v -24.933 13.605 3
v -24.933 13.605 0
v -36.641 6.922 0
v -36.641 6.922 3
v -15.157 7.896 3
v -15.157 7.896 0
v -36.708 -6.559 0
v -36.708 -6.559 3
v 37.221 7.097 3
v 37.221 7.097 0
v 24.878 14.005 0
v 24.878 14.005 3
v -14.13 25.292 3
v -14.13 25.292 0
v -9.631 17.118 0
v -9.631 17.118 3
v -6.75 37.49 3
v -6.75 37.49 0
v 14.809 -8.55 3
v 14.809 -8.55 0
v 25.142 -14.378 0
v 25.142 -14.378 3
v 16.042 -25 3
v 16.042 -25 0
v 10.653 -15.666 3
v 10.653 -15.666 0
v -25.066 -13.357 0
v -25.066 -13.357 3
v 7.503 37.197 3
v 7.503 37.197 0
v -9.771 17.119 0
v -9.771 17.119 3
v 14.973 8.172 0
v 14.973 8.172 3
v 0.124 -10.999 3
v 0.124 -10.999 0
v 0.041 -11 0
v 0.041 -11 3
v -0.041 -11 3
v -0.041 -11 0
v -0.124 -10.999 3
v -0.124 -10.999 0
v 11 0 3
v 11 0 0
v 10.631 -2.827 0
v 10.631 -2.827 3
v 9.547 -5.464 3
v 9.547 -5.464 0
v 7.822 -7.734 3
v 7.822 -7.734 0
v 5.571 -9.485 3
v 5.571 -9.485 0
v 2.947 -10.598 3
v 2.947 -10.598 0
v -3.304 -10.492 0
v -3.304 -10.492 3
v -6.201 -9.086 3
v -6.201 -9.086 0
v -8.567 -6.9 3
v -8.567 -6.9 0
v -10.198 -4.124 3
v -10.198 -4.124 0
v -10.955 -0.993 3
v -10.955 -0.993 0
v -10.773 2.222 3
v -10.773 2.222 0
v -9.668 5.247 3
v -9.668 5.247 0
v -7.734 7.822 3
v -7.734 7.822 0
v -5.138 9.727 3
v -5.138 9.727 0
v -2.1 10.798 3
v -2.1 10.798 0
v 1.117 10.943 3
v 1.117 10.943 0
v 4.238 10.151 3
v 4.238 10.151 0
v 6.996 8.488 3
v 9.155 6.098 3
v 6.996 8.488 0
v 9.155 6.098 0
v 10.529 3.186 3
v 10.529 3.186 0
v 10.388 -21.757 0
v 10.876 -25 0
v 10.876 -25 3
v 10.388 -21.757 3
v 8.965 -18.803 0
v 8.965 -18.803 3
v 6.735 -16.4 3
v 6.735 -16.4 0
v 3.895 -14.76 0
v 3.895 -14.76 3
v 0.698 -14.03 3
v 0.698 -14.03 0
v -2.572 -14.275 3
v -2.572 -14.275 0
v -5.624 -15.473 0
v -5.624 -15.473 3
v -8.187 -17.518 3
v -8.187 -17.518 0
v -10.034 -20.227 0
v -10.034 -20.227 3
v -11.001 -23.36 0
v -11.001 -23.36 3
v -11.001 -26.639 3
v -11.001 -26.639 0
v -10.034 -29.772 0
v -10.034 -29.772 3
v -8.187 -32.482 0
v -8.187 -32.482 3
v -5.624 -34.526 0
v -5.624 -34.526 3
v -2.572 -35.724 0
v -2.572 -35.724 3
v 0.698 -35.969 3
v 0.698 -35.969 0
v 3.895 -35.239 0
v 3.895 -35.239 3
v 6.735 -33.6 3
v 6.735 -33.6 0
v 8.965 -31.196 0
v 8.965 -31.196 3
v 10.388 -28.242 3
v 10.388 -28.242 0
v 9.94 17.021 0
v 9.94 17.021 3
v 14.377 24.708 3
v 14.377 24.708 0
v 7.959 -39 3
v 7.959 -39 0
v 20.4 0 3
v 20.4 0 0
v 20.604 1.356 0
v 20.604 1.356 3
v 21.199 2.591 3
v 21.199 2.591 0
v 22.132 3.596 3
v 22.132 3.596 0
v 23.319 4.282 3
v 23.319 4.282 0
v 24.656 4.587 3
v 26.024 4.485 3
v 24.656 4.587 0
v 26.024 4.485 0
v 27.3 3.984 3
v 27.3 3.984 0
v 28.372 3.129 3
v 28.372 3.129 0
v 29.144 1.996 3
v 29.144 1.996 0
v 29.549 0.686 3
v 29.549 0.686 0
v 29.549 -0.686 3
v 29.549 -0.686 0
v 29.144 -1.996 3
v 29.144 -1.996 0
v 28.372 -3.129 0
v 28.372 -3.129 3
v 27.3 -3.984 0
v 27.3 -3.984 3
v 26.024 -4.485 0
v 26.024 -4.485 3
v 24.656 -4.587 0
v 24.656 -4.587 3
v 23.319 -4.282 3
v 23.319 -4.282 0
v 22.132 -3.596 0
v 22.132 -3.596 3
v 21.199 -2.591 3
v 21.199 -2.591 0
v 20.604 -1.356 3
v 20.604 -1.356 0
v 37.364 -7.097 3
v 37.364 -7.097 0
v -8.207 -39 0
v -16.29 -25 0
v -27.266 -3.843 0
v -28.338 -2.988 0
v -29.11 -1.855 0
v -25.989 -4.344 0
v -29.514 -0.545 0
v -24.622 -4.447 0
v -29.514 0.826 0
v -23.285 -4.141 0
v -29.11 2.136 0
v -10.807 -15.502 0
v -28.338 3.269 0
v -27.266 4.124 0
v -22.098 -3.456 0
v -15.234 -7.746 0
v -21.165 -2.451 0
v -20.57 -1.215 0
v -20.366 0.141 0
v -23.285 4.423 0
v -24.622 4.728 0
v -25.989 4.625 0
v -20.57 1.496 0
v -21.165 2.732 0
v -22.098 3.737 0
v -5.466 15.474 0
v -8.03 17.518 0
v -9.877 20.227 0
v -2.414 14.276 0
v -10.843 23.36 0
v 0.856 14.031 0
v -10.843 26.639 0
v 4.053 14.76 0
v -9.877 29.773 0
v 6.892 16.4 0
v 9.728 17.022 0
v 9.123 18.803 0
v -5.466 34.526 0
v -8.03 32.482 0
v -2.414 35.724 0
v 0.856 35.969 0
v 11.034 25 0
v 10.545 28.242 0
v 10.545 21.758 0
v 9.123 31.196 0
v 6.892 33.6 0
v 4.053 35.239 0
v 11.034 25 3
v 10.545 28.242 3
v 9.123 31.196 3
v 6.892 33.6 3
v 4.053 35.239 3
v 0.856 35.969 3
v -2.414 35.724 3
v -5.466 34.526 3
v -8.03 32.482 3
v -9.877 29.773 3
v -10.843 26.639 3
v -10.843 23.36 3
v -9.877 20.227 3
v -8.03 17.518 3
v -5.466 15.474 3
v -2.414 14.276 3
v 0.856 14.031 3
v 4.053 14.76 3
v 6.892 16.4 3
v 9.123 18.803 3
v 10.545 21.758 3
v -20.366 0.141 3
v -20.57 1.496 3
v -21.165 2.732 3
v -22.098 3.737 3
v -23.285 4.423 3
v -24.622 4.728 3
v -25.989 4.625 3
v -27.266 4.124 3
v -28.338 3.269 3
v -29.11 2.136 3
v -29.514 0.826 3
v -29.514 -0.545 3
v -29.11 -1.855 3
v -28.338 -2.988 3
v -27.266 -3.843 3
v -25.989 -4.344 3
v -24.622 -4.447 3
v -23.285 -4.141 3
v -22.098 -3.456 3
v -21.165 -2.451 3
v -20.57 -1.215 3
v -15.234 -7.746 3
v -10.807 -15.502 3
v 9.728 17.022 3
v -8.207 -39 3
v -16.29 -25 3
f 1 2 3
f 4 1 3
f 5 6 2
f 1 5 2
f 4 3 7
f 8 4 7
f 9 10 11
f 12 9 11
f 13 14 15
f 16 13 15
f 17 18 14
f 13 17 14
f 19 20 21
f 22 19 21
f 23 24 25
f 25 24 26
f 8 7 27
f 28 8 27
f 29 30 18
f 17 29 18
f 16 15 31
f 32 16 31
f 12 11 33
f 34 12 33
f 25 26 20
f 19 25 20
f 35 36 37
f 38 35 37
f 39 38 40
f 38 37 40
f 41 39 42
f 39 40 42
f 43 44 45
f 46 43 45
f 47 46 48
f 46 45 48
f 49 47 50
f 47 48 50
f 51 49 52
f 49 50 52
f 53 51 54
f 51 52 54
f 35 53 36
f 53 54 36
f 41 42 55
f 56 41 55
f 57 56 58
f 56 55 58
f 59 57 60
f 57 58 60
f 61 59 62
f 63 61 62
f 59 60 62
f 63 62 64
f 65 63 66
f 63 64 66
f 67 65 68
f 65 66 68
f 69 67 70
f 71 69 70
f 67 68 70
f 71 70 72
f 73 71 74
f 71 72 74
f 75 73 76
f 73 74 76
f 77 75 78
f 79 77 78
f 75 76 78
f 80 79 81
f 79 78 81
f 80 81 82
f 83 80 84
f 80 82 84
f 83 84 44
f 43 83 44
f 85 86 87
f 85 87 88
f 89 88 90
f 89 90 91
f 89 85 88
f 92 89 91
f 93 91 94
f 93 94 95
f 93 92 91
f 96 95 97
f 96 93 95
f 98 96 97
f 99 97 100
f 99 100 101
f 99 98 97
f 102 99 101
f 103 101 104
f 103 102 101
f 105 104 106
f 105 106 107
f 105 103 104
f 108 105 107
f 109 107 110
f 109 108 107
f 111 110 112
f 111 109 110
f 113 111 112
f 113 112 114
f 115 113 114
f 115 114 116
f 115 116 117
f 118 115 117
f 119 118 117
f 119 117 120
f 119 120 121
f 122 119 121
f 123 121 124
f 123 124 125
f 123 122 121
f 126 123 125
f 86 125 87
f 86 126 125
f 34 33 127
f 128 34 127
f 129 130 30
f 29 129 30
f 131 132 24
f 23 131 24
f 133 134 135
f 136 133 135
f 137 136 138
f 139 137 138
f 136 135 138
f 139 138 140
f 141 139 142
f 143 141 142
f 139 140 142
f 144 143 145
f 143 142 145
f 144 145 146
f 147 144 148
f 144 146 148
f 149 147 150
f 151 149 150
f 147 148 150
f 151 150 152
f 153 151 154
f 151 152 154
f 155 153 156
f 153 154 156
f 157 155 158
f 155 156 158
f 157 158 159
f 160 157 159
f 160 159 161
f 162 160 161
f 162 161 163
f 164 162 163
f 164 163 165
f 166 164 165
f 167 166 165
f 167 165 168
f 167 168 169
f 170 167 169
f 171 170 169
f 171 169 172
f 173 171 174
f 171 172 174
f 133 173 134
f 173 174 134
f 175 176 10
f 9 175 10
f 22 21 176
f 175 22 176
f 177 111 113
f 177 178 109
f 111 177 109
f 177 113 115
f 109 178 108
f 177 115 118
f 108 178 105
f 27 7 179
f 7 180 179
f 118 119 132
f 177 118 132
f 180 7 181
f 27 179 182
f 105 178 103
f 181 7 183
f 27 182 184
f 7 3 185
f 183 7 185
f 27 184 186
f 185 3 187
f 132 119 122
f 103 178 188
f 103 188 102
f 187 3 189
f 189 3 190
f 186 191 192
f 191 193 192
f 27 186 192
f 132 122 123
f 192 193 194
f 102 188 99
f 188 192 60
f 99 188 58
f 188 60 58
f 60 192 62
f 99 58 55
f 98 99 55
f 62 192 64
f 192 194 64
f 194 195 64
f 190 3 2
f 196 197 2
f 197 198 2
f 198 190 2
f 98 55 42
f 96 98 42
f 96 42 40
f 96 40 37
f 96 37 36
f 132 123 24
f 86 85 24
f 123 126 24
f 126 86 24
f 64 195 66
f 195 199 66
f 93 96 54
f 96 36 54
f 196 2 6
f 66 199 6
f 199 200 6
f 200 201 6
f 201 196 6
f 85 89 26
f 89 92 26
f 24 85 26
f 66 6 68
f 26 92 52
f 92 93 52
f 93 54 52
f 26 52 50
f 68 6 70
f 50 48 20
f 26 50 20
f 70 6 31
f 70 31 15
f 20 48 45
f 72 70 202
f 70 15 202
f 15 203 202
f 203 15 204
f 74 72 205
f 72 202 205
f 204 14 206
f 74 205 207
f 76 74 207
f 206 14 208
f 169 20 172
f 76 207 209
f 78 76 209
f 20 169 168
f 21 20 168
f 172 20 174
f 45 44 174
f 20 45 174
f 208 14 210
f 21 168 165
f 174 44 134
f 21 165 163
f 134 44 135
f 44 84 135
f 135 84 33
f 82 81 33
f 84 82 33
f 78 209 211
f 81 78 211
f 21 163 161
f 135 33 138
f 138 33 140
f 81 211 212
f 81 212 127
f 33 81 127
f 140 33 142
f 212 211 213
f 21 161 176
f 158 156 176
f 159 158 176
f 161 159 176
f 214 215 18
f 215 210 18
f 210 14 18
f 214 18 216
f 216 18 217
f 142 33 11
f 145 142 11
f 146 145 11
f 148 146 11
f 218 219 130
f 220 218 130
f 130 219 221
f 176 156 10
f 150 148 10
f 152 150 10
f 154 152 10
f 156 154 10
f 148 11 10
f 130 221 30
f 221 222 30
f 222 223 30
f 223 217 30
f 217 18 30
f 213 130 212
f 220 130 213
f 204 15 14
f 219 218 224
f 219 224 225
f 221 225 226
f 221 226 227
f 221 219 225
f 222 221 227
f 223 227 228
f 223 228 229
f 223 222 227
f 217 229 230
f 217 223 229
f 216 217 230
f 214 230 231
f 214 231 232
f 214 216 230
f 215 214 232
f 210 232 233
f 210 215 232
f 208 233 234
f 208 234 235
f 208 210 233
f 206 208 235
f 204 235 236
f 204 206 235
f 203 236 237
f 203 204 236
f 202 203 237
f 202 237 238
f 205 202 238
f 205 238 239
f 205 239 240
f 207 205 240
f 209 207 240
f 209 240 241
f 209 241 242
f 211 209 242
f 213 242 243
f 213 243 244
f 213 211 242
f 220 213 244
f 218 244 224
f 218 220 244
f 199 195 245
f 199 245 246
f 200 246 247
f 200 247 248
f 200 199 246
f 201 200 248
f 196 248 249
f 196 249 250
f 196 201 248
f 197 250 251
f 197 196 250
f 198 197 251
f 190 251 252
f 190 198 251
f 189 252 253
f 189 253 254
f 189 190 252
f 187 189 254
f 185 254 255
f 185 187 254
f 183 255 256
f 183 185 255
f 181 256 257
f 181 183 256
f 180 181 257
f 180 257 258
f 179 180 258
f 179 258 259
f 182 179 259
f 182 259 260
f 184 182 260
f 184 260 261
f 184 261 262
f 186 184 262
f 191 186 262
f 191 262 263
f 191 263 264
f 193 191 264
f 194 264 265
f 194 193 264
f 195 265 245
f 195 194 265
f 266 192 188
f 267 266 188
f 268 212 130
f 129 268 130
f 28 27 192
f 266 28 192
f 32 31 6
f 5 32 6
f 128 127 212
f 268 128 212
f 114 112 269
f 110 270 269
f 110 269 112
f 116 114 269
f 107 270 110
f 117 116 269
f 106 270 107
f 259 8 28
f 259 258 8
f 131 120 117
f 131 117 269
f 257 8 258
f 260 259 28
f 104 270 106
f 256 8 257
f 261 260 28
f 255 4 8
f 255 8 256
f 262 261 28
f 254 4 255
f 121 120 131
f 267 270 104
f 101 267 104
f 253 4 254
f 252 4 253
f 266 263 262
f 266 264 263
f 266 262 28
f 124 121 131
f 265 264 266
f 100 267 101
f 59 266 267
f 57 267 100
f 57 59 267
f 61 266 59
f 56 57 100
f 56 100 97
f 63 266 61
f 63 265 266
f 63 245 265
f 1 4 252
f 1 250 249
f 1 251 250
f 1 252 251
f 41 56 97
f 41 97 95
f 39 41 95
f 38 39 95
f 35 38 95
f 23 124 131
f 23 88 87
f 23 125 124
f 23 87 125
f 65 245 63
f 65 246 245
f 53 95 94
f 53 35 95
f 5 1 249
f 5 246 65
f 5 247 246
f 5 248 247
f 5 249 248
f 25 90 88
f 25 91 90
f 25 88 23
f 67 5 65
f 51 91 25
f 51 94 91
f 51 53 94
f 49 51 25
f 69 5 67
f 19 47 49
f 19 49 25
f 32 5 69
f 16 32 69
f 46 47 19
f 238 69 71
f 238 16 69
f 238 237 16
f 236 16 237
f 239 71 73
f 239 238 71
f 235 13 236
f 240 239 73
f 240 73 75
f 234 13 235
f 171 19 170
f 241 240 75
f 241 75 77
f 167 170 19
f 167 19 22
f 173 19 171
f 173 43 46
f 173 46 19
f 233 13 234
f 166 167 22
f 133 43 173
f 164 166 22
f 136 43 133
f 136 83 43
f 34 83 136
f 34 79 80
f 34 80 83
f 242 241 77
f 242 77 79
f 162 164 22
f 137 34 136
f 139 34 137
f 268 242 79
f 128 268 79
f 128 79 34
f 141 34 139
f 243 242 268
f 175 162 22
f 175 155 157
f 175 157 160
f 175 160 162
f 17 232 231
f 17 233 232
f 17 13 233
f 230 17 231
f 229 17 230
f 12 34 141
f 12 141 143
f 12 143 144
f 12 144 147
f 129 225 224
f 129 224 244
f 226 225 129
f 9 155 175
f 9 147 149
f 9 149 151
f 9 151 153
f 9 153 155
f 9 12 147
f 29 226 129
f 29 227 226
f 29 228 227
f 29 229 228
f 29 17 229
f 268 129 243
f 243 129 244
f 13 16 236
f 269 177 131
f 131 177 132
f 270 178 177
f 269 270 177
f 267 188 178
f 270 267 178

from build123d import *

# Parameters (mm, degrees)
F0_R     = 11
F0_R_2   = 4.6
F1_DEPTH = 3


with BuildPart() as f1:
    # F0 (on Top) → F1 (new body)
    with BuildSketch(Plane.XY):
        with BuildLine():
            ThreePointArc((0.123785, -10.999303), (7.821817, -7.734286), (11, 0))
            ThreePointArc((11, 0), (-7.734286, 7.821817), (-0.123785, -10.999303))
            Line((-0.123785, -10.999303), (0.123785, -10.999303))
        make_face()
        with BuildLine():
            ThreePointArc((29.6, 0), (25, 4.6), (20.4, 0))
            ThreePointArc((20.4, 0), (25, -4.6), (29.6, 0))
        make_face()
        Polygon((14.973083, 8.172377), (9.939928, 17.021265), (9.727545, 17.022317), (14.377152, 24.707594), (7.503434, 37.197422), (-6.749933, 37.489521), (-14.129582, 25.291793), (-9.631268, 17.118172), (-9.770884, 17.118863), (-15.156777, 7.895989), (-24.932942, 13.604987), (-36.641381, 6.922195), (-36.708133, -6.559007), (-25.066445, -13.357416), (-15.234225, -7.745508), (-10.806813, -15.502459), (-16.290043, -24.999694), (-8.206914, -39.000084), (7.959344, -39.000084), (16.042473, -24.999694), (10.653492, -15.665704), (14.809085, -8.549611), (25.142257, -14.377539), (37.364294, -7.097444), (37.221359, 7.097444), (24.877534, 14.004538), align=None)
        with Locations((-0.123785, -24.999694)):
            Circle(F0_R, mode=Mode.SUBTRACT)
        with Locations((-24.965554, 0.140618)):
            Circle(F0_R_2, mode=Mode.SUBTRACT)
        with BuildLine():
            ThreePointArc((-0.123785, -10.999303), (-7.734286, 7.821817), (11, 0))
            ThreePointArc((11, 0), (7.821817, -7.734286), (0.123785, -10.999303))
            ThreePointArc((0.123785, -10.999303), (0, -11), (-0.123785, -10.999303))
        make_face(mode=Mode.SUBTRACT)
        with Locations((0.03405, 24.999808)):
            Circle(F0_R, mode=Mode.SUBTRACT)
        with BuildLine():
            ThreePointArc((29.6, 0), (25, -4.6), (20.4, 0))
            ThreePointArc((20.4, 0), (25, 4.6), (29.6, 0))
        make_face(mode=Mode.SUBTRACT)
    extrude(amount=F1_DEPTH)


solid = f1.part
